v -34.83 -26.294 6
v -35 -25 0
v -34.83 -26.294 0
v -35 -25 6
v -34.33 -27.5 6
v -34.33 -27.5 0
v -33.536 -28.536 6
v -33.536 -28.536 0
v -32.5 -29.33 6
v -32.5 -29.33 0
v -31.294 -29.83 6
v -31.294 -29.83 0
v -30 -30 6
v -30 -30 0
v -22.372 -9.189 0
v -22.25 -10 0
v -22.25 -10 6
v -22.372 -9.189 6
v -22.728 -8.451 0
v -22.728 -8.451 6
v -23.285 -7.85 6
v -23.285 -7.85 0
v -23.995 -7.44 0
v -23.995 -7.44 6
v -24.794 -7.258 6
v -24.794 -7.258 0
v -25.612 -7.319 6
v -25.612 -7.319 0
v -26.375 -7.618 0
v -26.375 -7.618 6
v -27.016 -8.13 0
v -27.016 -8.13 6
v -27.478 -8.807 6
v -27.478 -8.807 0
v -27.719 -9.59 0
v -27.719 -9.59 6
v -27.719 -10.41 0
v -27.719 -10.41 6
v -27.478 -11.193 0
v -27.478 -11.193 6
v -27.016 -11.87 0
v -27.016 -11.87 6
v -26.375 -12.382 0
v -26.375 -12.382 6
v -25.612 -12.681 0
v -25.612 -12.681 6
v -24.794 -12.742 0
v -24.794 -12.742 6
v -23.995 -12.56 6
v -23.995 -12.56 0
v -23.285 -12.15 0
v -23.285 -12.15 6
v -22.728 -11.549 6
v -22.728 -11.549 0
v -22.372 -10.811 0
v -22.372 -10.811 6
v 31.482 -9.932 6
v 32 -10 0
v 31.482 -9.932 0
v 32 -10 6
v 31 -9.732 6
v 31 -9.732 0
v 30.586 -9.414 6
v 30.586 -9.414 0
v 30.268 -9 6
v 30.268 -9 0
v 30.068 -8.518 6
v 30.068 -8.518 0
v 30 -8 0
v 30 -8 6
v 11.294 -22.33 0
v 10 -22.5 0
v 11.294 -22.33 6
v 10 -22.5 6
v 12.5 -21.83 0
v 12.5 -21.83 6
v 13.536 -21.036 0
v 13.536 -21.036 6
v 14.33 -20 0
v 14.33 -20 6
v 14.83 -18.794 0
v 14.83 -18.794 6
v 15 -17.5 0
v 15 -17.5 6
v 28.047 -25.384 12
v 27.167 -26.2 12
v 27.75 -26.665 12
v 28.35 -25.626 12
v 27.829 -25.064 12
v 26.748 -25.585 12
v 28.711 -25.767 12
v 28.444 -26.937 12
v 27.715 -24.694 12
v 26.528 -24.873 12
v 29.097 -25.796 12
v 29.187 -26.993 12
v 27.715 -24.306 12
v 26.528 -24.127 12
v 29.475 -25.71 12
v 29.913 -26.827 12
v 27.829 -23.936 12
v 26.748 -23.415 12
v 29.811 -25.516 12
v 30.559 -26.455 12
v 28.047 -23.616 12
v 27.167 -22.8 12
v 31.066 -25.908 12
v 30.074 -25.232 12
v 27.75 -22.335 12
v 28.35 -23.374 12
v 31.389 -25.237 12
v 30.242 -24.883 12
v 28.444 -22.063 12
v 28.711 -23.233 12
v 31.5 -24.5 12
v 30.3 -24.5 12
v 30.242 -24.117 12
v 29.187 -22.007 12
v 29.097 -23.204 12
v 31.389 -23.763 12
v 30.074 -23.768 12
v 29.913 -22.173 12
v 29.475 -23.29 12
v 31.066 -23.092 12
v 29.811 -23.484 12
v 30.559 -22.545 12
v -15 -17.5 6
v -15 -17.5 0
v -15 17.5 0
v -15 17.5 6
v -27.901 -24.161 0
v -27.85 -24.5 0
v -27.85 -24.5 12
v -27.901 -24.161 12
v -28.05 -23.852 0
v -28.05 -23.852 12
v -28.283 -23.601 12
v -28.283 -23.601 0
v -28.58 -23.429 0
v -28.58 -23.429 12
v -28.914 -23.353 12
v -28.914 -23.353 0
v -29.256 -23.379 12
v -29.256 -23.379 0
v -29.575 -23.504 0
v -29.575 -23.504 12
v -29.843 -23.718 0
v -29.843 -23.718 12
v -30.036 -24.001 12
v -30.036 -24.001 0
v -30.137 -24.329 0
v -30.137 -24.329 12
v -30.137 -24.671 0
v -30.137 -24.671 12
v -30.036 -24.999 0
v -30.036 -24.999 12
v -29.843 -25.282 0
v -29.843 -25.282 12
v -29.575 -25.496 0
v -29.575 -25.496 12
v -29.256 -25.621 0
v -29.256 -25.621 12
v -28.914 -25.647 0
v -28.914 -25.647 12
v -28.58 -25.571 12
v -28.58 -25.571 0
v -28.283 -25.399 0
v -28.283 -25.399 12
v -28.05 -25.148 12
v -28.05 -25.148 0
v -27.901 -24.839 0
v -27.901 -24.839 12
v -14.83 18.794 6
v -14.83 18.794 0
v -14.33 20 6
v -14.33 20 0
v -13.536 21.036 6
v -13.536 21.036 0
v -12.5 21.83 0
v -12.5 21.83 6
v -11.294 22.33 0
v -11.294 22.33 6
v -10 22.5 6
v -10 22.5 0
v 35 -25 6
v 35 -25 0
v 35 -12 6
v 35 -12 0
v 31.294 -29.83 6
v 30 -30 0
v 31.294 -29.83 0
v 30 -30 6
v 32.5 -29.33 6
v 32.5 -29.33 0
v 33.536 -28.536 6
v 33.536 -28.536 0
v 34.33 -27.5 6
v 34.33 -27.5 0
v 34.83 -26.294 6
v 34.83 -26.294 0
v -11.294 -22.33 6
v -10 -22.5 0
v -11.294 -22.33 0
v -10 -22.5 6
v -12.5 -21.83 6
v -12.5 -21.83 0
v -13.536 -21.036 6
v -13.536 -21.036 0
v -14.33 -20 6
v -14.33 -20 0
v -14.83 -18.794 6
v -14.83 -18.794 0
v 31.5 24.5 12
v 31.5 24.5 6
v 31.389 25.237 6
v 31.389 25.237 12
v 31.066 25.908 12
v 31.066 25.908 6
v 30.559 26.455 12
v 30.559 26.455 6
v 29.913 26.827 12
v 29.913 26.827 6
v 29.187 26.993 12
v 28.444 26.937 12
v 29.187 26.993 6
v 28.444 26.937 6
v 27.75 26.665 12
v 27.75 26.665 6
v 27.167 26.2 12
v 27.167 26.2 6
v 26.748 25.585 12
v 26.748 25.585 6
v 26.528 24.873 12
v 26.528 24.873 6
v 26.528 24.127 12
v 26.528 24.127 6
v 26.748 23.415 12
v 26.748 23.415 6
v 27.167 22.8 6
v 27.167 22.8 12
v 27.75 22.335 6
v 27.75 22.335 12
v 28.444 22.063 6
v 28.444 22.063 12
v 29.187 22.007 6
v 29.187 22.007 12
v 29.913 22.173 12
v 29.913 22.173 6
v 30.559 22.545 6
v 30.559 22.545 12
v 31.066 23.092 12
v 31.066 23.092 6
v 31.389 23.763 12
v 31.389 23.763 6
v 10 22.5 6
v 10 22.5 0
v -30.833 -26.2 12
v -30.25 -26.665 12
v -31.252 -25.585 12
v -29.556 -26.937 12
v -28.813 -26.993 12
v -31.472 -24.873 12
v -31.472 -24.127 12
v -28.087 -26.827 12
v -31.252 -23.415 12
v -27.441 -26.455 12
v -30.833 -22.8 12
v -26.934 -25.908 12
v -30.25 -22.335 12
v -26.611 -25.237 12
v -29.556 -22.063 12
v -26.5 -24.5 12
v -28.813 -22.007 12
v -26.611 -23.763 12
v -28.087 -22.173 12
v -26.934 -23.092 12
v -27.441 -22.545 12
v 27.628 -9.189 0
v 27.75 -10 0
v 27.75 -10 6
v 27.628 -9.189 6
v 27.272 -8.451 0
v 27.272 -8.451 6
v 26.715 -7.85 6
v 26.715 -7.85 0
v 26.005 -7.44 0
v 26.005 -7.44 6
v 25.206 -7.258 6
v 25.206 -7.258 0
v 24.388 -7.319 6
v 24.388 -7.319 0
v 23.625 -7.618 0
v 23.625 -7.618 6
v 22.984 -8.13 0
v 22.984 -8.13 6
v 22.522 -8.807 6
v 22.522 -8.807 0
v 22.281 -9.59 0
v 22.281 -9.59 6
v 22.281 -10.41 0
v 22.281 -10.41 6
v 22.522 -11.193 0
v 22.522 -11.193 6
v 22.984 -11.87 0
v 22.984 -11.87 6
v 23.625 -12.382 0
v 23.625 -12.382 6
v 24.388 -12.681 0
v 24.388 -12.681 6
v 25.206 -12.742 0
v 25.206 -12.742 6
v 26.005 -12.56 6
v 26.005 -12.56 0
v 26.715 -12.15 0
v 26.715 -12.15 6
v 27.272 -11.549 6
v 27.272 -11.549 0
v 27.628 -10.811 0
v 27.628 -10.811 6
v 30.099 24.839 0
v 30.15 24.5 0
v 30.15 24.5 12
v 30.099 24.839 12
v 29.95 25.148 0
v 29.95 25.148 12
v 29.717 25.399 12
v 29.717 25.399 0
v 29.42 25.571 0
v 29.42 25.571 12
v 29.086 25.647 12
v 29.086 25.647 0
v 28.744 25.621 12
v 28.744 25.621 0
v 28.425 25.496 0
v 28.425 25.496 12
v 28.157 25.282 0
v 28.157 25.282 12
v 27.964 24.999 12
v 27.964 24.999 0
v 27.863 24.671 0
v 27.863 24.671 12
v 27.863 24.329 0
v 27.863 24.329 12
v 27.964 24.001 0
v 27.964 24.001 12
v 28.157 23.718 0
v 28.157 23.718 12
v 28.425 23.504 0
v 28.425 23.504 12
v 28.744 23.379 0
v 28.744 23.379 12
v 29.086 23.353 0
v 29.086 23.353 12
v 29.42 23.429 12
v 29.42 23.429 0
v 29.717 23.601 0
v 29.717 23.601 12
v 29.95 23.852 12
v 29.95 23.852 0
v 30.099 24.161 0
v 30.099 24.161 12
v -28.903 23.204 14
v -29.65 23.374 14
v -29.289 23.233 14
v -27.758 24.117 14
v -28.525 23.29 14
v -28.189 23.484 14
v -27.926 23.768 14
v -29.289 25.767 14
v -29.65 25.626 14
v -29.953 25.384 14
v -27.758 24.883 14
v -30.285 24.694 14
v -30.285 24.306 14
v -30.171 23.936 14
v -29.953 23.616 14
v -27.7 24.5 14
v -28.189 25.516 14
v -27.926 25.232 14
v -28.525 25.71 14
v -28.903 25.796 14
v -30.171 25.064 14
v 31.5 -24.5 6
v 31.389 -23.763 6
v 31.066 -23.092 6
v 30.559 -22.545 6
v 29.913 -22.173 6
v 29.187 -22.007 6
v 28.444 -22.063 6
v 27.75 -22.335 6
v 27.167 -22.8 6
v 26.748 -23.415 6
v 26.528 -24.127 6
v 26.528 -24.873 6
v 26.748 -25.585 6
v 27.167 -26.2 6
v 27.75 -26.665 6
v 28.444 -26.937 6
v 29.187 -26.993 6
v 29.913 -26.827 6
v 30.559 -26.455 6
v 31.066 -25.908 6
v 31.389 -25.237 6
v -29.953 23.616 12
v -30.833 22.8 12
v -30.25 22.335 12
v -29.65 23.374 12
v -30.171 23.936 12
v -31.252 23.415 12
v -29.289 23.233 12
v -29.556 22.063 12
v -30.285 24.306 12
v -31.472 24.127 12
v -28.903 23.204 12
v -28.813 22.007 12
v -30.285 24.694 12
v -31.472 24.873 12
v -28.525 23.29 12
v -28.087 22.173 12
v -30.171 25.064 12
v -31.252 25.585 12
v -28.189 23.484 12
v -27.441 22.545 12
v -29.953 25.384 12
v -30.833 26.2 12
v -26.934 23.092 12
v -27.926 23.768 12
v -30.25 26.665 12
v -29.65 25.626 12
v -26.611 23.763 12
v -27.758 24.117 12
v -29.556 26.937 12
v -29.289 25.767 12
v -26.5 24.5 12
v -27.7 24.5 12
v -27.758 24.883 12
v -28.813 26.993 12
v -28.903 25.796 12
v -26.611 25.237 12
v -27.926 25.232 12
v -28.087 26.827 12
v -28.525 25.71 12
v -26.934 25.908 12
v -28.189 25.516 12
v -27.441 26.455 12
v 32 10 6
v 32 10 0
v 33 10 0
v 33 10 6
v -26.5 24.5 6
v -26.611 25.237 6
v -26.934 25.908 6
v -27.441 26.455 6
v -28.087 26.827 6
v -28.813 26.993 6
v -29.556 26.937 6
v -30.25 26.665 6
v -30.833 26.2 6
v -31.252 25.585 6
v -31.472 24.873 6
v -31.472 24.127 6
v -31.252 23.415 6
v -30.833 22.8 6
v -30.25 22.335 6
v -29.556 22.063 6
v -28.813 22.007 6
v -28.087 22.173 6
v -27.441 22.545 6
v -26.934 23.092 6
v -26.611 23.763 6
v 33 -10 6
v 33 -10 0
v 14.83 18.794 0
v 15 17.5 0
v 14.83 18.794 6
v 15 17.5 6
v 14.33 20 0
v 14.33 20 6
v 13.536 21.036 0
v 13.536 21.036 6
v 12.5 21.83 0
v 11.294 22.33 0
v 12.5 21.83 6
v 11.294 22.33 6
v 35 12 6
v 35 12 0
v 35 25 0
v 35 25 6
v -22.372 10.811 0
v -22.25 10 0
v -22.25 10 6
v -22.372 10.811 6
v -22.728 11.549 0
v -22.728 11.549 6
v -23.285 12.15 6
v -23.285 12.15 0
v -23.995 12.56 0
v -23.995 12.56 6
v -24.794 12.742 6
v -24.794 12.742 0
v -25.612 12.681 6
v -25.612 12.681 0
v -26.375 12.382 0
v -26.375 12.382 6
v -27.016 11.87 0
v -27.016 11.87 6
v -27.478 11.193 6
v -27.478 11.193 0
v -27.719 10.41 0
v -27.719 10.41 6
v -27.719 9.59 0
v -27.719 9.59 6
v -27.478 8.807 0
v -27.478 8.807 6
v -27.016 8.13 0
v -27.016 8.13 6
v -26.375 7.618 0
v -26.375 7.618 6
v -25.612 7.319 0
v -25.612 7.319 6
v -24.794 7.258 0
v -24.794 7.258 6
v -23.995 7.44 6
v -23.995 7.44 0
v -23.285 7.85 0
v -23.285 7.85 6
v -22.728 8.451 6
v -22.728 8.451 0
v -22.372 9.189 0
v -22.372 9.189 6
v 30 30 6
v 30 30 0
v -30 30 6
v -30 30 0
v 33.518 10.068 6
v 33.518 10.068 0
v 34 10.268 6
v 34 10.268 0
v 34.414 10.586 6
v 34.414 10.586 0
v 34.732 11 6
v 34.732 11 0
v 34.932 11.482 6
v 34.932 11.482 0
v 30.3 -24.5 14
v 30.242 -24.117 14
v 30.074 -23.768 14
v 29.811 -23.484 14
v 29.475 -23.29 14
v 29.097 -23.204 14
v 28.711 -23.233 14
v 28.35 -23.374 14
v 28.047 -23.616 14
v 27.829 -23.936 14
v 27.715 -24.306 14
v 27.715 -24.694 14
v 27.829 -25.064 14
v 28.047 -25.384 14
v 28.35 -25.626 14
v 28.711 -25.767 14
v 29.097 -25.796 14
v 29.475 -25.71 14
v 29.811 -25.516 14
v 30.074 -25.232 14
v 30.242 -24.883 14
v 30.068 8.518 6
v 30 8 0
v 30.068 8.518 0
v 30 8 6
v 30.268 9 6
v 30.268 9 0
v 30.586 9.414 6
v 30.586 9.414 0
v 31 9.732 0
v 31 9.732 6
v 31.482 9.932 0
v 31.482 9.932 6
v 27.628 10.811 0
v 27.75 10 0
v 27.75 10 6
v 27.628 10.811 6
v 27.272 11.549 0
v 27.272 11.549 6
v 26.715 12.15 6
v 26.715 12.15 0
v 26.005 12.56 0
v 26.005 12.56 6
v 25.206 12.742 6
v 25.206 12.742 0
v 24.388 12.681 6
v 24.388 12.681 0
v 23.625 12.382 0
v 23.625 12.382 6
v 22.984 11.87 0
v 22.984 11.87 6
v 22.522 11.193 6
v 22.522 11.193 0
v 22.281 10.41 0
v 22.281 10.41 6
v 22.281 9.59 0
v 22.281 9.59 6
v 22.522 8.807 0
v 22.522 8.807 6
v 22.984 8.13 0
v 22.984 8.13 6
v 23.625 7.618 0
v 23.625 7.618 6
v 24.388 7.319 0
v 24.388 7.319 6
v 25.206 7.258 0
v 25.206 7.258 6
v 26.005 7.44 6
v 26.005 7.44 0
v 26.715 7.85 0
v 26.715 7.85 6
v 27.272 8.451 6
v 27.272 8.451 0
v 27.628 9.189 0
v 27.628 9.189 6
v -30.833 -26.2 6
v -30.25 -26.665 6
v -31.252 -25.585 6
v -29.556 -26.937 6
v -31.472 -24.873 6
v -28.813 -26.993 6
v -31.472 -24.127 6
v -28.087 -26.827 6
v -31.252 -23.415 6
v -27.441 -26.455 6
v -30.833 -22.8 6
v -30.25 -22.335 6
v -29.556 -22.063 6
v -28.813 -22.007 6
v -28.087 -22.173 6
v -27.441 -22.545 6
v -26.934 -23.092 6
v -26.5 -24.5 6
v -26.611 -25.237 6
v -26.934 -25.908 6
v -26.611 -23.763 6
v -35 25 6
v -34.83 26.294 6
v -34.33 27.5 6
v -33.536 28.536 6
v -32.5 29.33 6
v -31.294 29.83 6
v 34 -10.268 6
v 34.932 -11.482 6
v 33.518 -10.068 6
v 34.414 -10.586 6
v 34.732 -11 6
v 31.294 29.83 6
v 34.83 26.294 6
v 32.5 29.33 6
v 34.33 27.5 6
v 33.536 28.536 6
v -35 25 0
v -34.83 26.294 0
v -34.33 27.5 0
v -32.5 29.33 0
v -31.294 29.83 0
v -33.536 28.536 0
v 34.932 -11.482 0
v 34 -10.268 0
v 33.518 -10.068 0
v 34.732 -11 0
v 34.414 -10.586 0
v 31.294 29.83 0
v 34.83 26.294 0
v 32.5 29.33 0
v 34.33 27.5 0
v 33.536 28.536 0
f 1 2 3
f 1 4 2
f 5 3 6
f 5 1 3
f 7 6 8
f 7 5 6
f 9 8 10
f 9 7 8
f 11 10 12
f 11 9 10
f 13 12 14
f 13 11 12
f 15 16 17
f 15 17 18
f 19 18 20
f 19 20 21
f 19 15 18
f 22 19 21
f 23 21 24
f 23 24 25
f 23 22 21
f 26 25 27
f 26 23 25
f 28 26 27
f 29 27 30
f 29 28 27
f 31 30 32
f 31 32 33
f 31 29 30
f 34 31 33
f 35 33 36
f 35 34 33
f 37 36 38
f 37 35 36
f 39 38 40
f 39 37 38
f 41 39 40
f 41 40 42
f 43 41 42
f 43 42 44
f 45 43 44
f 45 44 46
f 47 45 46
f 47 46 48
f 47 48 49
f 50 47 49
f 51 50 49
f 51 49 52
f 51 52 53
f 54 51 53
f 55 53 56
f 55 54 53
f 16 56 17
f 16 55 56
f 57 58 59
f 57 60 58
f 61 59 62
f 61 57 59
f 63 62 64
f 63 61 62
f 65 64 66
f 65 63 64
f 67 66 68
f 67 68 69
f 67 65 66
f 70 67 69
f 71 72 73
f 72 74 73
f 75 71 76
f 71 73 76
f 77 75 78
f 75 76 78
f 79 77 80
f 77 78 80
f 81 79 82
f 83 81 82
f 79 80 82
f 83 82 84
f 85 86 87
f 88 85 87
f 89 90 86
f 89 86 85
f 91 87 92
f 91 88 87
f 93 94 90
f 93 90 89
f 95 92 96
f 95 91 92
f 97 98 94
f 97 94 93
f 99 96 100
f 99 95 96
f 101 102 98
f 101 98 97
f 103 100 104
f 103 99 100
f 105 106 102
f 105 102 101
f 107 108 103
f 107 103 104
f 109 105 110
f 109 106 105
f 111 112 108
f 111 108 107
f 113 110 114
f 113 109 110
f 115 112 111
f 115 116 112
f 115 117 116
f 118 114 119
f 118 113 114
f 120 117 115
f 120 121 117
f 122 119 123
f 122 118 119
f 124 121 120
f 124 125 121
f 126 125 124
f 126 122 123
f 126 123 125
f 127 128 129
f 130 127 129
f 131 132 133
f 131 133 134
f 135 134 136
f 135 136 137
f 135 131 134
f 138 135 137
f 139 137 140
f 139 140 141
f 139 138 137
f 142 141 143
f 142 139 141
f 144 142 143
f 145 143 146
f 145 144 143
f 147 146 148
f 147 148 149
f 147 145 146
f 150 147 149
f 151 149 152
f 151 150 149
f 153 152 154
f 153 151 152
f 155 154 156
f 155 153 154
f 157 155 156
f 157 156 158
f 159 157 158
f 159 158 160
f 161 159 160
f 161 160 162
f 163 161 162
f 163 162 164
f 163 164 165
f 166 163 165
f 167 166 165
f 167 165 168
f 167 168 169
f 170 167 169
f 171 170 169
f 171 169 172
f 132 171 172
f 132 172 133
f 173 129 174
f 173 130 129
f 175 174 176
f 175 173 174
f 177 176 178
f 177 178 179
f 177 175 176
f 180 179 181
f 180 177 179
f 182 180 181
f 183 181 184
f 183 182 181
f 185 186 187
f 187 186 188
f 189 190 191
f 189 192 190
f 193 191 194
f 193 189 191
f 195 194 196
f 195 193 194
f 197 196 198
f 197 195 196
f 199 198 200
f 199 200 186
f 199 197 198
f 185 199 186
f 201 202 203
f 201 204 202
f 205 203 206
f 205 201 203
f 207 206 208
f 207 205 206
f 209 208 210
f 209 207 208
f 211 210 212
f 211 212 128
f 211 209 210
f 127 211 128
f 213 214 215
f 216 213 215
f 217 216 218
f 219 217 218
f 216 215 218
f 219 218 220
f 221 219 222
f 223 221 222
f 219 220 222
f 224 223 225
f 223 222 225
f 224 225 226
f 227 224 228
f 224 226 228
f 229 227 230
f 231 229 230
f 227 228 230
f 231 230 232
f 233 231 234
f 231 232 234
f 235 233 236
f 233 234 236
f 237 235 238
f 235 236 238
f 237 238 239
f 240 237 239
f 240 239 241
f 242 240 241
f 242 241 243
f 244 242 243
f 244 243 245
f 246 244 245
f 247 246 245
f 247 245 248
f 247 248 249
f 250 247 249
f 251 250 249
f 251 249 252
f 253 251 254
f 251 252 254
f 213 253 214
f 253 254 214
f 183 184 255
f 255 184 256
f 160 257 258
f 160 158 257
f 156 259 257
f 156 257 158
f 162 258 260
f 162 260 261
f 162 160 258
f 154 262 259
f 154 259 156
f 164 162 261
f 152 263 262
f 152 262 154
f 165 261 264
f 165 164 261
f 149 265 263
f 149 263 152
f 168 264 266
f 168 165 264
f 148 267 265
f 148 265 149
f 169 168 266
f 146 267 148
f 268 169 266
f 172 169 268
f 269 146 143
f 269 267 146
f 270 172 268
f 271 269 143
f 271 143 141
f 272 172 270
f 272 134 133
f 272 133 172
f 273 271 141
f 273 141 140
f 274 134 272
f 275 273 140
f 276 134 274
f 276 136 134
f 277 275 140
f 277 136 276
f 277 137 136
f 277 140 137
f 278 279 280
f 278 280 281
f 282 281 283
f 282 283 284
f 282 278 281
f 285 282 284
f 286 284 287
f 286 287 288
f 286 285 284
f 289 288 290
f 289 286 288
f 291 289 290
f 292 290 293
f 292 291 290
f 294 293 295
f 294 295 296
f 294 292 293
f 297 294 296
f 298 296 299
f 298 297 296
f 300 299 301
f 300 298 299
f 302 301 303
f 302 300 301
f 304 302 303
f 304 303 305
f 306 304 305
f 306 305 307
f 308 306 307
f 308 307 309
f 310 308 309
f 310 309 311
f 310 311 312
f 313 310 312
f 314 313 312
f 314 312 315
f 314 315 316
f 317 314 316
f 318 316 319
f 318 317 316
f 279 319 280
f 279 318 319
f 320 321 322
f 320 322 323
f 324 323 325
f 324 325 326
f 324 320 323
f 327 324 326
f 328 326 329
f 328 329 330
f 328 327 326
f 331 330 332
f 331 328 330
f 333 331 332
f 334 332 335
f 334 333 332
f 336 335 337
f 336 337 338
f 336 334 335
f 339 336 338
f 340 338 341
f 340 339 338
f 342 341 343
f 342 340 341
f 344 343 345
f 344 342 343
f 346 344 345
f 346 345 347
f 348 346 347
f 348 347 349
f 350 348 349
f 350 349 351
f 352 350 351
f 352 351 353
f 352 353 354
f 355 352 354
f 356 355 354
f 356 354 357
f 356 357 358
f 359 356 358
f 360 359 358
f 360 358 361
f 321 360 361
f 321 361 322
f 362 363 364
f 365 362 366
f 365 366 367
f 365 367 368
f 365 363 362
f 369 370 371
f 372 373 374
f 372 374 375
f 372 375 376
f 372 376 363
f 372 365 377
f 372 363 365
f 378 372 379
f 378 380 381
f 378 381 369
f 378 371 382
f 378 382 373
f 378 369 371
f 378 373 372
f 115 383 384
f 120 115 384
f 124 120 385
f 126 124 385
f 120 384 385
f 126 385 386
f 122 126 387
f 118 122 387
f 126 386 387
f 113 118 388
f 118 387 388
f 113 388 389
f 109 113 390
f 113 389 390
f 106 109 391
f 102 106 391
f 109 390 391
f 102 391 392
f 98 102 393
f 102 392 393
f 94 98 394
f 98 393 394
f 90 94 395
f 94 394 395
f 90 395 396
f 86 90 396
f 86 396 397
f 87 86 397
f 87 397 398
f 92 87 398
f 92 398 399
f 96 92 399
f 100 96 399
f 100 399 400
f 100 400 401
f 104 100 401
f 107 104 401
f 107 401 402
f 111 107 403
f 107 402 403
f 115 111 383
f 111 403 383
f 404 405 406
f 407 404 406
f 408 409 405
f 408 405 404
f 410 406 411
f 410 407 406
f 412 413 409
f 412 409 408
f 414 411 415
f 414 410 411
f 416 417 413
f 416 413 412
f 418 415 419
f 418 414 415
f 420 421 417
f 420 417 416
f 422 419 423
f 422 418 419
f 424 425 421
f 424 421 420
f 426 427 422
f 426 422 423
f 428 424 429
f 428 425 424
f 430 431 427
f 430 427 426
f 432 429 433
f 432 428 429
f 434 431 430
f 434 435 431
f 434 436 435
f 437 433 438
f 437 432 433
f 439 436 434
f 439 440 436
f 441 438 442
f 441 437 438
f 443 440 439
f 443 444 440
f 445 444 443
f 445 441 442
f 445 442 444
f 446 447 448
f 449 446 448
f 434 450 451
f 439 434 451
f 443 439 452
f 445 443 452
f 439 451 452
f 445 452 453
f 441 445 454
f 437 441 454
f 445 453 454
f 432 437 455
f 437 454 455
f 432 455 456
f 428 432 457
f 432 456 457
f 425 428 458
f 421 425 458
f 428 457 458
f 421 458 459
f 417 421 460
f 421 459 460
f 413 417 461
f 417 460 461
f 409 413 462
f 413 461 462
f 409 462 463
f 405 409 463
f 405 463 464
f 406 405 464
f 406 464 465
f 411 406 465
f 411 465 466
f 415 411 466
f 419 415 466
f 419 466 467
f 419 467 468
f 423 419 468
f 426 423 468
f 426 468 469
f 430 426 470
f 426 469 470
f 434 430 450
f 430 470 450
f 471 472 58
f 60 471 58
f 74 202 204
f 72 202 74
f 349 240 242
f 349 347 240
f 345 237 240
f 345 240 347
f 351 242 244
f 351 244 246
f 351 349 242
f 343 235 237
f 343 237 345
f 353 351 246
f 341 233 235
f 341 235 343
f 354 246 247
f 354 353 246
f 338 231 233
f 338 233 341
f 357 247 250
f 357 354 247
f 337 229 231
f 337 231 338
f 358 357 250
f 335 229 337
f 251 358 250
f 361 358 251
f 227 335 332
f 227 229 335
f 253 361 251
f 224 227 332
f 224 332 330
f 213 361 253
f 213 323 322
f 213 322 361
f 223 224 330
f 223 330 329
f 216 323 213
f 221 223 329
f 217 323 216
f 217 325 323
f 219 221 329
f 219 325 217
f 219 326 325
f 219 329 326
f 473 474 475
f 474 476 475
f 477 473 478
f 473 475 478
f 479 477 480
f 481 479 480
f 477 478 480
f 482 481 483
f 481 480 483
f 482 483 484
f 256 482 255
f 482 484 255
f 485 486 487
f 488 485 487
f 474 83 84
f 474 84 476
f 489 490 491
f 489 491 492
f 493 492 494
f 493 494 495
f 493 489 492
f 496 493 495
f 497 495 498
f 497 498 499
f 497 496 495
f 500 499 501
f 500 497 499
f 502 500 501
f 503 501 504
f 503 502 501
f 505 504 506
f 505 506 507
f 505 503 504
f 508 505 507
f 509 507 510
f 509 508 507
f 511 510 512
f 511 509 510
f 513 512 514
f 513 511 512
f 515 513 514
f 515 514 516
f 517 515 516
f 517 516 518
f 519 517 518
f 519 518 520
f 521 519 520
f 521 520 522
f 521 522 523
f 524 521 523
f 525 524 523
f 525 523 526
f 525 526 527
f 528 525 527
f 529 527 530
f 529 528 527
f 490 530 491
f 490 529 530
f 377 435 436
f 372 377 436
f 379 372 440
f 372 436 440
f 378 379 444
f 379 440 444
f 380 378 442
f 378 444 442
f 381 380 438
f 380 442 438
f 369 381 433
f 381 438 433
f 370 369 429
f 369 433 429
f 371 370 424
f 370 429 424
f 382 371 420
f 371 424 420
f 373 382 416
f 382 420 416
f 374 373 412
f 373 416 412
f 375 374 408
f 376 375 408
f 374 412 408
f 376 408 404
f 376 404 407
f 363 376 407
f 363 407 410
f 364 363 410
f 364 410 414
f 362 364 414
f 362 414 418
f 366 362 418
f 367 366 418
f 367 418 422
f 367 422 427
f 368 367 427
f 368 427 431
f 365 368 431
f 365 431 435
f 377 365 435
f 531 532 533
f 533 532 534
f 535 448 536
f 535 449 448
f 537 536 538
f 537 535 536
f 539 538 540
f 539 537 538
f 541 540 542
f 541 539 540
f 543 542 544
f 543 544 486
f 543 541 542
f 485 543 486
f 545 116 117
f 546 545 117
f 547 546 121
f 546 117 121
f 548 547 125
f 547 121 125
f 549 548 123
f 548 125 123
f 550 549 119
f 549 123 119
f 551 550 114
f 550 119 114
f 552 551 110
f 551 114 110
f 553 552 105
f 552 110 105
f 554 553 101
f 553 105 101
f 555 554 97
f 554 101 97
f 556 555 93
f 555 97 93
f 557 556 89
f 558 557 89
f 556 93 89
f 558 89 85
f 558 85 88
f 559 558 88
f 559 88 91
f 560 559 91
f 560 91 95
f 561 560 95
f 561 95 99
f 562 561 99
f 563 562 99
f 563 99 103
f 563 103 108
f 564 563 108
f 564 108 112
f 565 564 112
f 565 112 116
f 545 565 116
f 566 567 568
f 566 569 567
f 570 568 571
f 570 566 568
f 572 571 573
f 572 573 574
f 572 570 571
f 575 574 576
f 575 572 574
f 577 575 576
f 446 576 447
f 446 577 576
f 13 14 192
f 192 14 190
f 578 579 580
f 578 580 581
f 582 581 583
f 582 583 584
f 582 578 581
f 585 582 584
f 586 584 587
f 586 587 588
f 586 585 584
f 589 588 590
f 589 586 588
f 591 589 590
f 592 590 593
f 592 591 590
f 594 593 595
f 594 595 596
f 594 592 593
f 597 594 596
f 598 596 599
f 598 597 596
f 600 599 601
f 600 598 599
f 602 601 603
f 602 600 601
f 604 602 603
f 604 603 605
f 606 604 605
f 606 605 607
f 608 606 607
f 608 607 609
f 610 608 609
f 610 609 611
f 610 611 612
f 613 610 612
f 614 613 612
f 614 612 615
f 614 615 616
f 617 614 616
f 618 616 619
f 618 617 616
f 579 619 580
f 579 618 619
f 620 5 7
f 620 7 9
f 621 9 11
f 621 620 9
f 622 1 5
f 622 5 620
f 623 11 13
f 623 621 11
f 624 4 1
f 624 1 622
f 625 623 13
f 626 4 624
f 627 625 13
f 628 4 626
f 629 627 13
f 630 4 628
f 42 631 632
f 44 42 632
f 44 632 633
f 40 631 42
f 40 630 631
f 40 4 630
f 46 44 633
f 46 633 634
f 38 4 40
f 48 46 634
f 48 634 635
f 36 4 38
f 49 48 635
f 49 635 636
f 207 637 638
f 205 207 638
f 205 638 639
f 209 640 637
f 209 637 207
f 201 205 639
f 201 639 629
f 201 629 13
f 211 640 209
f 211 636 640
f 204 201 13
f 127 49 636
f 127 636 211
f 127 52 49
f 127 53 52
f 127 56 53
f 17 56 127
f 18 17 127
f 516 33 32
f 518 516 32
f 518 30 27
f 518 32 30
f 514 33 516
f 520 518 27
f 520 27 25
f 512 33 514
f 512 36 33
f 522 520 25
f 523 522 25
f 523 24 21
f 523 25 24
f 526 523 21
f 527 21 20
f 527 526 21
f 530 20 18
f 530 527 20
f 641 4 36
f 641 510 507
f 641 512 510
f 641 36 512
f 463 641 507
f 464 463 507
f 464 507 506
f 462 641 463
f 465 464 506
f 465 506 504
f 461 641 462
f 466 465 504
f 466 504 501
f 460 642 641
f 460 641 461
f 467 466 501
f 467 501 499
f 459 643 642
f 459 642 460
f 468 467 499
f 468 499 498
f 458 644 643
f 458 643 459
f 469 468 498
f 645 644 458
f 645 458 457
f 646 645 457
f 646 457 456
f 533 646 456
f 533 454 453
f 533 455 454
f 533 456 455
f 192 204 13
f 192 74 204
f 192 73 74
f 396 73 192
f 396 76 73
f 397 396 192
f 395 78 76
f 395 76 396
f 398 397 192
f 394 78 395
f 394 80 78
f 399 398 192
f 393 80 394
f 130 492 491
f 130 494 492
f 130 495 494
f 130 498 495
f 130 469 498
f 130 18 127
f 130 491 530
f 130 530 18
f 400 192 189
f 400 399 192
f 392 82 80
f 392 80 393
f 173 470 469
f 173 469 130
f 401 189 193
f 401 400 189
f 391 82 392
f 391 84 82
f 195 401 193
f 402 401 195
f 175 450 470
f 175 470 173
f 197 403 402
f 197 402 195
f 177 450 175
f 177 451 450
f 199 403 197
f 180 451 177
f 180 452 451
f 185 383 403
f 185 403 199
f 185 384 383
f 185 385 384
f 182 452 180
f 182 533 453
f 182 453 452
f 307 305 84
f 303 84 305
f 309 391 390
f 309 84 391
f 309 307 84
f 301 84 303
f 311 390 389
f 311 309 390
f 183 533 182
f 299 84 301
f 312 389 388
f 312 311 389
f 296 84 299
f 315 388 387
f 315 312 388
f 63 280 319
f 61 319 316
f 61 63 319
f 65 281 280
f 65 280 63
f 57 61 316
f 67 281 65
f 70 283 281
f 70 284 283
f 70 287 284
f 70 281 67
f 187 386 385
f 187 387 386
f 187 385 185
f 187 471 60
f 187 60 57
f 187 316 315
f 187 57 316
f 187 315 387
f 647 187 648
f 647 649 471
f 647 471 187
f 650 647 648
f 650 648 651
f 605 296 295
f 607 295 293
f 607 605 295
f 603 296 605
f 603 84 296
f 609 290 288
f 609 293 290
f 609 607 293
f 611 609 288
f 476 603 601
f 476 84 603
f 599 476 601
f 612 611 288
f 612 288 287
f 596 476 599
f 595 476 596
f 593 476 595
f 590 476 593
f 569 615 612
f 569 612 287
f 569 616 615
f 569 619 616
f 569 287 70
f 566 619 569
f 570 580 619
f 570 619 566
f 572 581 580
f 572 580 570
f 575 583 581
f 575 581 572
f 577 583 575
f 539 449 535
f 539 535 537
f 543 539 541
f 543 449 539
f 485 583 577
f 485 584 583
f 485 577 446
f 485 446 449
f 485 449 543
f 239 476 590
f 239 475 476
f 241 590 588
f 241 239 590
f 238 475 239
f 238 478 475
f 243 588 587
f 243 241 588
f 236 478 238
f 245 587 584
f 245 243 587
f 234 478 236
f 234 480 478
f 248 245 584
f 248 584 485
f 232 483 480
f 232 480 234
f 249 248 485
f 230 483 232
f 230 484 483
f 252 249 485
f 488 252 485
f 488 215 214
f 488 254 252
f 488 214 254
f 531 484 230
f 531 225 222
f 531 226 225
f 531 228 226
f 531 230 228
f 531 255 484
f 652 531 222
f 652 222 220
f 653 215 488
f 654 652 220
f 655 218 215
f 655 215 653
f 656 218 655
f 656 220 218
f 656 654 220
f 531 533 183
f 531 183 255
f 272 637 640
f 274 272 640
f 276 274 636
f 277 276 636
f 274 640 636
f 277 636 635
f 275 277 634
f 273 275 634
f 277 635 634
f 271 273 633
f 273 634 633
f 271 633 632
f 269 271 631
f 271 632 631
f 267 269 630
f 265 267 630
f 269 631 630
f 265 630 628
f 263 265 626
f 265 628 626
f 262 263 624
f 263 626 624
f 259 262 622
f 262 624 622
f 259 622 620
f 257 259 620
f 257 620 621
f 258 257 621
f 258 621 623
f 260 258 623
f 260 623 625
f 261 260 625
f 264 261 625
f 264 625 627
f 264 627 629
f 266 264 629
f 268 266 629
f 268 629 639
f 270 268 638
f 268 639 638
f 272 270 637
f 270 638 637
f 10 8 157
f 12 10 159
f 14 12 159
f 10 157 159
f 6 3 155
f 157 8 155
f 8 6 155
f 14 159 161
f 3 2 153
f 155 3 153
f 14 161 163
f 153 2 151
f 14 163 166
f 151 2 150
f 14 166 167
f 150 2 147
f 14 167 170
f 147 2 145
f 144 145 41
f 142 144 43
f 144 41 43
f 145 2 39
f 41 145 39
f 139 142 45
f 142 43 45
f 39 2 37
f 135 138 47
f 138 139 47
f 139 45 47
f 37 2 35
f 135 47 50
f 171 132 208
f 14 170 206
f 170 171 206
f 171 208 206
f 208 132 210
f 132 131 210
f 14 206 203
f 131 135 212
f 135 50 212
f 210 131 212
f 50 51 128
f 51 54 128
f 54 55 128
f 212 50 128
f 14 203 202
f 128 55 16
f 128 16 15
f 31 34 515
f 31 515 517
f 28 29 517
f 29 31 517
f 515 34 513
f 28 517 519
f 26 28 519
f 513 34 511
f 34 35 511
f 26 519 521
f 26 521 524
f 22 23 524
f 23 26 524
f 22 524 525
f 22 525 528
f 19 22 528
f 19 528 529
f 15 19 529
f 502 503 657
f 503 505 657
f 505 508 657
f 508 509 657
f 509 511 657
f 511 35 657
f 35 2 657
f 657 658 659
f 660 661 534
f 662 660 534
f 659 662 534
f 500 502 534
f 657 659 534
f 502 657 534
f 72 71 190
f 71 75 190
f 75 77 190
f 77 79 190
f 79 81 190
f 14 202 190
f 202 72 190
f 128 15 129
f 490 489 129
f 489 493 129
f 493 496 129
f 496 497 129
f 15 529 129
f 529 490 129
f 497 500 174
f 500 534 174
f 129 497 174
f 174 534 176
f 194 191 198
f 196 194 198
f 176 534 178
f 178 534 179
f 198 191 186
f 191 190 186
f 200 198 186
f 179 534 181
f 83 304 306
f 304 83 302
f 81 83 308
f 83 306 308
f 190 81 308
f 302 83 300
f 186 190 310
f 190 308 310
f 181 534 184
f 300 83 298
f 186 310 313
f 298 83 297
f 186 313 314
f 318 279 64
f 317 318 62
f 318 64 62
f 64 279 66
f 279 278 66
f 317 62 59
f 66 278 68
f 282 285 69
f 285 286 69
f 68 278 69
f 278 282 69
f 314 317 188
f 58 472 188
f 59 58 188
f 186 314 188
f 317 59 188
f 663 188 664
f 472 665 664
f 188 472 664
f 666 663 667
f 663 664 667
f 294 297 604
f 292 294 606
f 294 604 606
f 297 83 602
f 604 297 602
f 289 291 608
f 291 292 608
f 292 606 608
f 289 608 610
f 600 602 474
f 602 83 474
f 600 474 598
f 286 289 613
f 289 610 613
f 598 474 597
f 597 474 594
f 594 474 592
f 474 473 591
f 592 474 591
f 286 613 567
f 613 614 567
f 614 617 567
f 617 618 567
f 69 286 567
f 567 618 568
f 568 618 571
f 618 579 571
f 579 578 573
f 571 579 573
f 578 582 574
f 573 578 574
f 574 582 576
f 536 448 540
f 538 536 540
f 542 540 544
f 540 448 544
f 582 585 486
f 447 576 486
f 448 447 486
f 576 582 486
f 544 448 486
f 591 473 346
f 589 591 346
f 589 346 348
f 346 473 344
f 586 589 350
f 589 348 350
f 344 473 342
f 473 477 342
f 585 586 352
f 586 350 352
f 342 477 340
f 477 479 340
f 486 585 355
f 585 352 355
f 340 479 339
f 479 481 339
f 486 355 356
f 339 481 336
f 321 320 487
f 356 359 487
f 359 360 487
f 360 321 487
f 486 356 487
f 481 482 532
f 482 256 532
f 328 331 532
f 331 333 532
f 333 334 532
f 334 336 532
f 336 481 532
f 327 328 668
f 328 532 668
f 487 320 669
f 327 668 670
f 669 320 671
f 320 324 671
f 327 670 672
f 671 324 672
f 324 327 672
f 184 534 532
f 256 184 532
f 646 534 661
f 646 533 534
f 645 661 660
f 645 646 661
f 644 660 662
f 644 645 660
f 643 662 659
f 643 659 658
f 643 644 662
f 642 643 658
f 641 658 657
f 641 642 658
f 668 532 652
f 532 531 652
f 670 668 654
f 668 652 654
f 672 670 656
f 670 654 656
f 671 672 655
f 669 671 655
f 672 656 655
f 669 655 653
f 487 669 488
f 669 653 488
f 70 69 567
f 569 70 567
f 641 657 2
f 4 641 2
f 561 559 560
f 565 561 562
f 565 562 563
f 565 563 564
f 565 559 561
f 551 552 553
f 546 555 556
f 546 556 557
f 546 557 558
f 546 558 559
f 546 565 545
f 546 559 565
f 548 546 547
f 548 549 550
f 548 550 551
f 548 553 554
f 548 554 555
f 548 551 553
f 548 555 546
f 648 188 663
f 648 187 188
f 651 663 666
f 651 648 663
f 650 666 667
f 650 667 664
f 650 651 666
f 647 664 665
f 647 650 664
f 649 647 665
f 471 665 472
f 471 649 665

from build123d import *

# Parameters (mm, degrees)
F0_R     = 1.15
F0_R_2   = 2.75
F0_W     = 30
F0_H     = 45
F1_DEPTH = 6
F2_R     = 5
F4_R     = 2.5
F5_DEPTH = 6
F3_R     = 1.3
F6_DEPTH = 8
F7_R     = 1.15
F8_DEPTH = 25
F9_R     = 2


# Not quite as in the source:
# - a feature names something its author has since deleted; it is built from what else it names


with BuildPart() as f1:
    # F0 (on Top) → F1 (new body)
    with BuildSketch(Plane.XY):
        Polygon((35, 30), (-35, 30), (-35, -30), (35, -30), (35, -10), (30, -10), (30, 10), (35, 10), align=None)
        with Locations((-29, -24.5)):
            Circle(F0_R, mode=Mode.SUBTRACT)
        with Locations((-25, -10)):
            Circle(F0_R_2, mode=Mode.SUBTRACT)
        with Locations((25, -10)):
            Circle(F0_R_2, mode=Mode.SUBTRACT)
        with Locations((-25, 10)):
            Circle(F0_R_2, mode=Mode.SUBTRACT)
        Rectangle(F0_W, F0_H, mode=Mode.SUBTRACT)
        with Locations((25, 10)):
            Circle(F0_R_2, mode=Mode.SUBTRACT)
        with Locations((29, 24.5)):
            Circle(F0_R, mode=Mode.SUBTRACT)
    extrude(amount=F1_DEPTH)

    # F2
    f2_edges = [f1.edges().sort_by_distance(p)[0] for p in [
        (-35, -30, 3),
        (-35, 30, 3),
        (-15, 22.5, 3),
        (15, 22.5, 3),
        (15, -22.5, 3),
        (-15, -22.5, 3),
        (35, 30, 3),
        (35, -30, 3),
    ]]
    fillet(f2_edges, radius=F2_R)

    # F4 (on face) → F5 (join)
    with BuildSketch(Plane.XY.offset(6)):
        with Locations((-29, 24.5)):
            Circle(F4_R)
        with Locations((29, 24.5)):
            Circle(F4_R)
        with Locations((29, -24.5)):
            Circle(F4_R)
        with Locations((-29, -24.5)):
            Circle(F4_R)
    extrude(amount=F5_DEPTH)

    # F3 (on face) → F6 (join)
    with BuildSketch(Plane.XY.offset(6)):
        with Locations((-29, 24.5)):
            Circle(F3_R)
        with Locations((29, -24.5)):
            Circle(F3_R)
    extrude(amount=F6_DEPTH)

    # F7 (on face) → F8 (cut)
    with BuildSketch(Plane.XY.offset(12)):
        with Locations((-29, -24.5)):
            Circle(F7_R)
        with Locations((29, 24.5)):
            Circle(F7_R)
    extrude(amount=-F8_DEPTH, mode=Mode.SUBTRACT)

    # F9
    f9_edges = [f1.edges().sort_by_distance(p)[0] for p in [
        (35, 10, 3),
        (30, 10, 3),
        (30, -10, 3),
        (35, -10, 3),
    ]]
    fillet(f9_edges, radius=F9_R)


solid = f1.part
